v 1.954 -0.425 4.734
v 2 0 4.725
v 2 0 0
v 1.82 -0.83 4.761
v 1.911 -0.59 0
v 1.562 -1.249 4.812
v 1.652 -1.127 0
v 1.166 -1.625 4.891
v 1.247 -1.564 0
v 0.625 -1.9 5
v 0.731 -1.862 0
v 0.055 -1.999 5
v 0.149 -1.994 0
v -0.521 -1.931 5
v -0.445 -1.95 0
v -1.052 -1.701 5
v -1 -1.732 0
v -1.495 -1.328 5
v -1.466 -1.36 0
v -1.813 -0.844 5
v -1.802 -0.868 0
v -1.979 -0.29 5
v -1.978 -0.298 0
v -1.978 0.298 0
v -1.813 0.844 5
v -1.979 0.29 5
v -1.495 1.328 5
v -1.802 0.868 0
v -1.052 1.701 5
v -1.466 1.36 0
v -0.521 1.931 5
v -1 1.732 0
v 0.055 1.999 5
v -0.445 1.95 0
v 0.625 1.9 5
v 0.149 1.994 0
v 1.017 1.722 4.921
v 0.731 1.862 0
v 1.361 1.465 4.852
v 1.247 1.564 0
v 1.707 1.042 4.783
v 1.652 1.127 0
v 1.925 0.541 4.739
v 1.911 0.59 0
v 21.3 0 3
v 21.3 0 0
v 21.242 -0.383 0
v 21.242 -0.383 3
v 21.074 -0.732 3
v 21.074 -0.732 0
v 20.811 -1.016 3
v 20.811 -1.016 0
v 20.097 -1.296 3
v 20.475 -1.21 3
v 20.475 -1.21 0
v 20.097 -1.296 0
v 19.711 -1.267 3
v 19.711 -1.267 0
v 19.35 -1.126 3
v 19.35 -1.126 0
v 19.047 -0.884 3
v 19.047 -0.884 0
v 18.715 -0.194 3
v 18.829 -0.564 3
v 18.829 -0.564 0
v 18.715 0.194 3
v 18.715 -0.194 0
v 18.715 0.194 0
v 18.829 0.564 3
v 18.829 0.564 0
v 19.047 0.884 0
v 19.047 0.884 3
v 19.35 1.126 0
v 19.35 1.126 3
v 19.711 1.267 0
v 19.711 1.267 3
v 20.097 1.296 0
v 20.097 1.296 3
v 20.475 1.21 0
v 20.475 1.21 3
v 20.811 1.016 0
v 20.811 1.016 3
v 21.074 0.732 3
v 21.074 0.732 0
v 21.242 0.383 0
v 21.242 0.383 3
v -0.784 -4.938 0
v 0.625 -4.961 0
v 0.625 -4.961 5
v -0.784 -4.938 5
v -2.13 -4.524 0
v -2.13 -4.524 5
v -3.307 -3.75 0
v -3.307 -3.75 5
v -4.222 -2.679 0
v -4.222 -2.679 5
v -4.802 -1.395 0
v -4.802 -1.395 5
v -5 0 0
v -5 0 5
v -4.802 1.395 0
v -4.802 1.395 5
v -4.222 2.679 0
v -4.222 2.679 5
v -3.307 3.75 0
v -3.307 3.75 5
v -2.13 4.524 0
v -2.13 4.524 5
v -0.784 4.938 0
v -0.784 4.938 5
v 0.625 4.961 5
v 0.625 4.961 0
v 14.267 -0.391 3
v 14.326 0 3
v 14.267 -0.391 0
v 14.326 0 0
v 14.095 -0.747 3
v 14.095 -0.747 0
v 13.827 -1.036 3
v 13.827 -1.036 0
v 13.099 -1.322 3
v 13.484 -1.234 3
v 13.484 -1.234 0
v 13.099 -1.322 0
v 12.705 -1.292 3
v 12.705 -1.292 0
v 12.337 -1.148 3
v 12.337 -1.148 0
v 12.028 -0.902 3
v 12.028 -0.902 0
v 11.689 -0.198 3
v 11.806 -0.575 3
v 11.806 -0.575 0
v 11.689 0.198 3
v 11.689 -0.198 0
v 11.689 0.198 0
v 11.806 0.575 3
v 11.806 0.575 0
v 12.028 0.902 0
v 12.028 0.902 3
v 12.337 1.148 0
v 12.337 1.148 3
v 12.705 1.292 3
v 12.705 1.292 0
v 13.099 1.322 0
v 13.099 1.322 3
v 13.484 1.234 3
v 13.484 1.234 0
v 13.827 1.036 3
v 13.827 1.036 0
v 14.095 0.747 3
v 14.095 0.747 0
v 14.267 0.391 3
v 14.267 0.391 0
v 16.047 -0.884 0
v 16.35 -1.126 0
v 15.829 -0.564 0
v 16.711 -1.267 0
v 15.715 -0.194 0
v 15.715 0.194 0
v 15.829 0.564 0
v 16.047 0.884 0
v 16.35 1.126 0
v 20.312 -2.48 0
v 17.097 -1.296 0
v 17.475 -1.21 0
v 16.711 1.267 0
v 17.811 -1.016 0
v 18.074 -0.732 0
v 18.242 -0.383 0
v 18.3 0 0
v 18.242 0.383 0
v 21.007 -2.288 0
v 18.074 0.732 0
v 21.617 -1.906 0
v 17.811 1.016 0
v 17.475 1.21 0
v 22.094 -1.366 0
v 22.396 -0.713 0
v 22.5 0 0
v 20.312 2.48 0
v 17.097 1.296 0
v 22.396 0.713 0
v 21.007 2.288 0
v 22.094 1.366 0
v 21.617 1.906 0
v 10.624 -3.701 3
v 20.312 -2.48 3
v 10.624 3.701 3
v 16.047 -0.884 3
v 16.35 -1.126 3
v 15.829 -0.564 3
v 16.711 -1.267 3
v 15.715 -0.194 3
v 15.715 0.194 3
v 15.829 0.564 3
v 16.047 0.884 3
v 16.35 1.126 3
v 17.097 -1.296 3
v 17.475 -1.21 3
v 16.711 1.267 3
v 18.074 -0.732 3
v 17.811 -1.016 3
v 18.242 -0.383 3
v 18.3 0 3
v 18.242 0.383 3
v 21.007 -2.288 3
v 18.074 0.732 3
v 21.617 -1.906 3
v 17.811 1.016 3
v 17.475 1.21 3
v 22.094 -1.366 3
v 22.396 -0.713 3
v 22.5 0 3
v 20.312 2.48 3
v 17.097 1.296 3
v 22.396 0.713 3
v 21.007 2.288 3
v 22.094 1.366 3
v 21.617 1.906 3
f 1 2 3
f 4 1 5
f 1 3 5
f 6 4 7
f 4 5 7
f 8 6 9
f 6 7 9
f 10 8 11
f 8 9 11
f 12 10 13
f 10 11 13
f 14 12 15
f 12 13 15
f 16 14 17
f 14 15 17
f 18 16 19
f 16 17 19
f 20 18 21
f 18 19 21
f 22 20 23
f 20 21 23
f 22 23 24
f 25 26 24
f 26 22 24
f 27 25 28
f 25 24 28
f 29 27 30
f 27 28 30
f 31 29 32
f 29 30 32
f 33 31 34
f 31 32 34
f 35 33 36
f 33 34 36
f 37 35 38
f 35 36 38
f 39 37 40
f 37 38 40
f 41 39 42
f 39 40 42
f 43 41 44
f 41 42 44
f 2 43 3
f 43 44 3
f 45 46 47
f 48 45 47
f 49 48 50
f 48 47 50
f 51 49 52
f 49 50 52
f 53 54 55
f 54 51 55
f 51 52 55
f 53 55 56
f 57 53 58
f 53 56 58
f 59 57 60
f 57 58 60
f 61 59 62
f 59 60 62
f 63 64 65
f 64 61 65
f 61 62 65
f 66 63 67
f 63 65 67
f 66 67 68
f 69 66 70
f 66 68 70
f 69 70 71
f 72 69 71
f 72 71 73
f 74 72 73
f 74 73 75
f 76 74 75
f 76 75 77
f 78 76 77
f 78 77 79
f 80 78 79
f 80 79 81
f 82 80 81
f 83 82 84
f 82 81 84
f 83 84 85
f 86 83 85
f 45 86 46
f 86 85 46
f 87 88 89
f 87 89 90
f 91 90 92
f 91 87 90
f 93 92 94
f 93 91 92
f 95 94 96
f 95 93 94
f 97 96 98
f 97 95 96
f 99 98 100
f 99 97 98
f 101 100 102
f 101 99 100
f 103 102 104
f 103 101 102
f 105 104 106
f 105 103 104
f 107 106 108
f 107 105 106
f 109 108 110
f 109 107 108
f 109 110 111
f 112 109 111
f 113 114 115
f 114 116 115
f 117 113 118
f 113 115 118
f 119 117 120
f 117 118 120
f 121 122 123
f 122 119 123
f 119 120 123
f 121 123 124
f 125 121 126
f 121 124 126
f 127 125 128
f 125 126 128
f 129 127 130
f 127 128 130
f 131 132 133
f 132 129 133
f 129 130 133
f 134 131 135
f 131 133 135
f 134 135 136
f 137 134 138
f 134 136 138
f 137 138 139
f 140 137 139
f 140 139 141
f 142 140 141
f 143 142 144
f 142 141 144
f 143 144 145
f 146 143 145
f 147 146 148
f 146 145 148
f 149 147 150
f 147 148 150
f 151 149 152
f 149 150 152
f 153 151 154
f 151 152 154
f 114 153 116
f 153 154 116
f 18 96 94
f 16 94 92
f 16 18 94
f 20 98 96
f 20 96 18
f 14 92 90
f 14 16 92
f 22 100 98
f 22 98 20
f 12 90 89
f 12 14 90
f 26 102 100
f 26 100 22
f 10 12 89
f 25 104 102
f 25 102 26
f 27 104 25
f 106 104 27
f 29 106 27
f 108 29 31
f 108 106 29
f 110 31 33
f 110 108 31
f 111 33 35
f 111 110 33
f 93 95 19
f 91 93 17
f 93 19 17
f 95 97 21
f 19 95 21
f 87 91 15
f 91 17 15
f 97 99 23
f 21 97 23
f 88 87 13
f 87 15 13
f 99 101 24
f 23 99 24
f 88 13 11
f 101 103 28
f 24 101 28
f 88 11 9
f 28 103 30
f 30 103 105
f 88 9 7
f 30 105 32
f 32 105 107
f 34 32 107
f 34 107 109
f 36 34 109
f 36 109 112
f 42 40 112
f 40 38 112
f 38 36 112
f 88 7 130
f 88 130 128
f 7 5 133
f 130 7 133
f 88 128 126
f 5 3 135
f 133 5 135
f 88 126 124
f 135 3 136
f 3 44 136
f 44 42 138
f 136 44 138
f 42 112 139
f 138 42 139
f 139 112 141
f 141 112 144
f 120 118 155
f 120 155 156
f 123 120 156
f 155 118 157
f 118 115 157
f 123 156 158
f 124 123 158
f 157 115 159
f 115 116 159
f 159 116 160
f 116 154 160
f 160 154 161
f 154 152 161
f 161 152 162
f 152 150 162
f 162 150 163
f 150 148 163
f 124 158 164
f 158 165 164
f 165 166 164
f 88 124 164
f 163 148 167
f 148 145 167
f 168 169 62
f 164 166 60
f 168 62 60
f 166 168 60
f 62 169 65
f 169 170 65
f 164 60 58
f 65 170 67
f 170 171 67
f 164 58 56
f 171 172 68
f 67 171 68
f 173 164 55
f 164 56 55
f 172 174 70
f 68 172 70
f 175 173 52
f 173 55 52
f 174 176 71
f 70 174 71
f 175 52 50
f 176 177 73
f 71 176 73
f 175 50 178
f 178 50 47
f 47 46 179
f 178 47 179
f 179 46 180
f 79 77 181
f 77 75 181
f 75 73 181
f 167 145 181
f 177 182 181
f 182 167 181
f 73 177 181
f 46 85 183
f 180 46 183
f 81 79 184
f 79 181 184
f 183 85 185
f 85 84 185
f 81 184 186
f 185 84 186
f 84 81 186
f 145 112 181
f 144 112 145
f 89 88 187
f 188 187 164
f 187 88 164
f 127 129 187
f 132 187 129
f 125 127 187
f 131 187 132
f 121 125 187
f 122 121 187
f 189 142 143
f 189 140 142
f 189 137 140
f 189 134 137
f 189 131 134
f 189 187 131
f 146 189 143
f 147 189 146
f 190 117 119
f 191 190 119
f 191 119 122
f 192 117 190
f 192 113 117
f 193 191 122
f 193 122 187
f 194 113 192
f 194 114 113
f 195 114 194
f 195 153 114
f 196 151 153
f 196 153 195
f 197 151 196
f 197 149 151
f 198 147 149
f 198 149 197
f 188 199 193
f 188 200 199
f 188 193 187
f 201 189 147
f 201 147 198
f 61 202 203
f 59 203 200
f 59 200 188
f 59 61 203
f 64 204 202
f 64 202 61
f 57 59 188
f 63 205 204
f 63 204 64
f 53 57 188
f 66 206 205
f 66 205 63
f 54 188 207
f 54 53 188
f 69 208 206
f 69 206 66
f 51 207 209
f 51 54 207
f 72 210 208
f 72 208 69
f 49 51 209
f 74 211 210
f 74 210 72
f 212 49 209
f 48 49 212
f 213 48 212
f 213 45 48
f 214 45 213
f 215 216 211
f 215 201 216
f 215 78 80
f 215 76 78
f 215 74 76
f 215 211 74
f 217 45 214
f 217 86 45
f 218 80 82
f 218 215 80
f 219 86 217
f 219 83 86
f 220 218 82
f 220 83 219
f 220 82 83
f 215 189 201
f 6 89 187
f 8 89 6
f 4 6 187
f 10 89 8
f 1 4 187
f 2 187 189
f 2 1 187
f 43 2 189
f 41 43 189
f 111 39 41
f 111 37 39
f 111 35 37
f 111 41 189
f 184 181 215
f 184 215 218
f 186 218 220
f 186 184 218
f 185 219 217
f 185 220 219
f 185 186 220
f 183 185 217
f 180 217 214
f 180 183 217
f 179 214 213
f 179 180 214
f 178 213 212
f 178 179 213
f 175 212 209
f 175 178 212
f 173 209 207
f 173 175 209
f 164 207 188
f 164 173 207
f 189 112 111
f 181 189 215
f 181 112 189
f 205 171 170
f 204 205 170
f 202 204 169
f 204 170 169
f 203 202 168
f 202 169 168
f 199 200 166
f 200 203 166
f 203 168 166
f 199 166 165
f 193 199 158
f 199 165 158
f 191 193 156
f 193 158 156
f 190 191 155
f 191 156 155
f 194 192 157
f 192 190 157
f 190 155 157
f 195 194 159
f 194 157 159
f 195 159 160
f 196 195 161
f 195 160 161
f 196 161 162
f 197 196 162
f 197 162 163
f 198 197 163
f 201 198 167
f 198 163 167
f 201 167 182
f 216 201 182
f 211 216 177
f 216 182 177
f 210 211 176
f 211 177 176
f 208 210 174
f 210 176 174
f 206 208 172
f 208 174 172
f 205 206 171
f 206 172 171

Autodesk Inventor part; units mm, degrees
ref_plane "YZ Plane" through (0, 0, 0) normal (1, 0, 0) x (0, 1, 0)
ref_plane "XZ Plane" through (0, 0, 0) normal (0, 1, 0) x (-1, 0, 0)
ref_plane "XY Plane" through (0, 0, 0) normal (0, 0, 1) x (1, 0, 0)
sketch "Skizze1" plane through (0, 0, 0) normal (0, 0, 1) x (1, 0, 0)
  line L0 (0, 7) -> (0, -7) construction
  line L1 (-10.5, 0) -> (28, 0) construction
  circle A0 centre (0, 0) radius 2
  circle A1 centre (13, 0) radius 1.3257
  circle A2 centre (17, 0) radius 1.3
  circle A3 centre (20, 0) radius 1.3
  arc A4 (20.3125, -2.4804) -> (20.3125, 2.4804) centre (20, 0) ccw
  arc A5 (0.625, 4.9608) -> (0.625, -4.9608) centre (0, 0) ccw
  line L2 (0.625, 4.9608) -> (20.3125, 2.4804)
  line L3 (0.625, -4.9608) -> (20.3125, -2.4804)
  line L4 (0.625, -4.9608) -> (0.625, -1.8998)
  line L5 (0.625, 1.8998) -> (0.625, 4.9608)
  line L6 (0.625, 1.8998) -> (0.625, -1.8998)
  dimension "d0" = 13
  dimension "d1" = 17
  dimension "d2" = 20
  dimension "d3" = 5
  dimension "d4" = 2.6
  dimension "d5" = 4
  dimension "d6" = 10
extrude "Extrusion1" add sketch "Skizze1" along normal blind 3
extrude "Extrusion2" add sketch "Skizze1" along normal blind 5 contours L6 A0 | A0 L4 A5 L5 picked at (-0.25, 0)
chamfer "Fase1" distance 10 distance2 2 1 edges at (0.625, 0, 3) measured on face at (4.3081, 0, 3)
extrude "Extrusion3" cut sketch "Skizze1" along normal blind 5 contours A0 L6 | L6 A0
properties part number "Servo-Arm-20mm"
